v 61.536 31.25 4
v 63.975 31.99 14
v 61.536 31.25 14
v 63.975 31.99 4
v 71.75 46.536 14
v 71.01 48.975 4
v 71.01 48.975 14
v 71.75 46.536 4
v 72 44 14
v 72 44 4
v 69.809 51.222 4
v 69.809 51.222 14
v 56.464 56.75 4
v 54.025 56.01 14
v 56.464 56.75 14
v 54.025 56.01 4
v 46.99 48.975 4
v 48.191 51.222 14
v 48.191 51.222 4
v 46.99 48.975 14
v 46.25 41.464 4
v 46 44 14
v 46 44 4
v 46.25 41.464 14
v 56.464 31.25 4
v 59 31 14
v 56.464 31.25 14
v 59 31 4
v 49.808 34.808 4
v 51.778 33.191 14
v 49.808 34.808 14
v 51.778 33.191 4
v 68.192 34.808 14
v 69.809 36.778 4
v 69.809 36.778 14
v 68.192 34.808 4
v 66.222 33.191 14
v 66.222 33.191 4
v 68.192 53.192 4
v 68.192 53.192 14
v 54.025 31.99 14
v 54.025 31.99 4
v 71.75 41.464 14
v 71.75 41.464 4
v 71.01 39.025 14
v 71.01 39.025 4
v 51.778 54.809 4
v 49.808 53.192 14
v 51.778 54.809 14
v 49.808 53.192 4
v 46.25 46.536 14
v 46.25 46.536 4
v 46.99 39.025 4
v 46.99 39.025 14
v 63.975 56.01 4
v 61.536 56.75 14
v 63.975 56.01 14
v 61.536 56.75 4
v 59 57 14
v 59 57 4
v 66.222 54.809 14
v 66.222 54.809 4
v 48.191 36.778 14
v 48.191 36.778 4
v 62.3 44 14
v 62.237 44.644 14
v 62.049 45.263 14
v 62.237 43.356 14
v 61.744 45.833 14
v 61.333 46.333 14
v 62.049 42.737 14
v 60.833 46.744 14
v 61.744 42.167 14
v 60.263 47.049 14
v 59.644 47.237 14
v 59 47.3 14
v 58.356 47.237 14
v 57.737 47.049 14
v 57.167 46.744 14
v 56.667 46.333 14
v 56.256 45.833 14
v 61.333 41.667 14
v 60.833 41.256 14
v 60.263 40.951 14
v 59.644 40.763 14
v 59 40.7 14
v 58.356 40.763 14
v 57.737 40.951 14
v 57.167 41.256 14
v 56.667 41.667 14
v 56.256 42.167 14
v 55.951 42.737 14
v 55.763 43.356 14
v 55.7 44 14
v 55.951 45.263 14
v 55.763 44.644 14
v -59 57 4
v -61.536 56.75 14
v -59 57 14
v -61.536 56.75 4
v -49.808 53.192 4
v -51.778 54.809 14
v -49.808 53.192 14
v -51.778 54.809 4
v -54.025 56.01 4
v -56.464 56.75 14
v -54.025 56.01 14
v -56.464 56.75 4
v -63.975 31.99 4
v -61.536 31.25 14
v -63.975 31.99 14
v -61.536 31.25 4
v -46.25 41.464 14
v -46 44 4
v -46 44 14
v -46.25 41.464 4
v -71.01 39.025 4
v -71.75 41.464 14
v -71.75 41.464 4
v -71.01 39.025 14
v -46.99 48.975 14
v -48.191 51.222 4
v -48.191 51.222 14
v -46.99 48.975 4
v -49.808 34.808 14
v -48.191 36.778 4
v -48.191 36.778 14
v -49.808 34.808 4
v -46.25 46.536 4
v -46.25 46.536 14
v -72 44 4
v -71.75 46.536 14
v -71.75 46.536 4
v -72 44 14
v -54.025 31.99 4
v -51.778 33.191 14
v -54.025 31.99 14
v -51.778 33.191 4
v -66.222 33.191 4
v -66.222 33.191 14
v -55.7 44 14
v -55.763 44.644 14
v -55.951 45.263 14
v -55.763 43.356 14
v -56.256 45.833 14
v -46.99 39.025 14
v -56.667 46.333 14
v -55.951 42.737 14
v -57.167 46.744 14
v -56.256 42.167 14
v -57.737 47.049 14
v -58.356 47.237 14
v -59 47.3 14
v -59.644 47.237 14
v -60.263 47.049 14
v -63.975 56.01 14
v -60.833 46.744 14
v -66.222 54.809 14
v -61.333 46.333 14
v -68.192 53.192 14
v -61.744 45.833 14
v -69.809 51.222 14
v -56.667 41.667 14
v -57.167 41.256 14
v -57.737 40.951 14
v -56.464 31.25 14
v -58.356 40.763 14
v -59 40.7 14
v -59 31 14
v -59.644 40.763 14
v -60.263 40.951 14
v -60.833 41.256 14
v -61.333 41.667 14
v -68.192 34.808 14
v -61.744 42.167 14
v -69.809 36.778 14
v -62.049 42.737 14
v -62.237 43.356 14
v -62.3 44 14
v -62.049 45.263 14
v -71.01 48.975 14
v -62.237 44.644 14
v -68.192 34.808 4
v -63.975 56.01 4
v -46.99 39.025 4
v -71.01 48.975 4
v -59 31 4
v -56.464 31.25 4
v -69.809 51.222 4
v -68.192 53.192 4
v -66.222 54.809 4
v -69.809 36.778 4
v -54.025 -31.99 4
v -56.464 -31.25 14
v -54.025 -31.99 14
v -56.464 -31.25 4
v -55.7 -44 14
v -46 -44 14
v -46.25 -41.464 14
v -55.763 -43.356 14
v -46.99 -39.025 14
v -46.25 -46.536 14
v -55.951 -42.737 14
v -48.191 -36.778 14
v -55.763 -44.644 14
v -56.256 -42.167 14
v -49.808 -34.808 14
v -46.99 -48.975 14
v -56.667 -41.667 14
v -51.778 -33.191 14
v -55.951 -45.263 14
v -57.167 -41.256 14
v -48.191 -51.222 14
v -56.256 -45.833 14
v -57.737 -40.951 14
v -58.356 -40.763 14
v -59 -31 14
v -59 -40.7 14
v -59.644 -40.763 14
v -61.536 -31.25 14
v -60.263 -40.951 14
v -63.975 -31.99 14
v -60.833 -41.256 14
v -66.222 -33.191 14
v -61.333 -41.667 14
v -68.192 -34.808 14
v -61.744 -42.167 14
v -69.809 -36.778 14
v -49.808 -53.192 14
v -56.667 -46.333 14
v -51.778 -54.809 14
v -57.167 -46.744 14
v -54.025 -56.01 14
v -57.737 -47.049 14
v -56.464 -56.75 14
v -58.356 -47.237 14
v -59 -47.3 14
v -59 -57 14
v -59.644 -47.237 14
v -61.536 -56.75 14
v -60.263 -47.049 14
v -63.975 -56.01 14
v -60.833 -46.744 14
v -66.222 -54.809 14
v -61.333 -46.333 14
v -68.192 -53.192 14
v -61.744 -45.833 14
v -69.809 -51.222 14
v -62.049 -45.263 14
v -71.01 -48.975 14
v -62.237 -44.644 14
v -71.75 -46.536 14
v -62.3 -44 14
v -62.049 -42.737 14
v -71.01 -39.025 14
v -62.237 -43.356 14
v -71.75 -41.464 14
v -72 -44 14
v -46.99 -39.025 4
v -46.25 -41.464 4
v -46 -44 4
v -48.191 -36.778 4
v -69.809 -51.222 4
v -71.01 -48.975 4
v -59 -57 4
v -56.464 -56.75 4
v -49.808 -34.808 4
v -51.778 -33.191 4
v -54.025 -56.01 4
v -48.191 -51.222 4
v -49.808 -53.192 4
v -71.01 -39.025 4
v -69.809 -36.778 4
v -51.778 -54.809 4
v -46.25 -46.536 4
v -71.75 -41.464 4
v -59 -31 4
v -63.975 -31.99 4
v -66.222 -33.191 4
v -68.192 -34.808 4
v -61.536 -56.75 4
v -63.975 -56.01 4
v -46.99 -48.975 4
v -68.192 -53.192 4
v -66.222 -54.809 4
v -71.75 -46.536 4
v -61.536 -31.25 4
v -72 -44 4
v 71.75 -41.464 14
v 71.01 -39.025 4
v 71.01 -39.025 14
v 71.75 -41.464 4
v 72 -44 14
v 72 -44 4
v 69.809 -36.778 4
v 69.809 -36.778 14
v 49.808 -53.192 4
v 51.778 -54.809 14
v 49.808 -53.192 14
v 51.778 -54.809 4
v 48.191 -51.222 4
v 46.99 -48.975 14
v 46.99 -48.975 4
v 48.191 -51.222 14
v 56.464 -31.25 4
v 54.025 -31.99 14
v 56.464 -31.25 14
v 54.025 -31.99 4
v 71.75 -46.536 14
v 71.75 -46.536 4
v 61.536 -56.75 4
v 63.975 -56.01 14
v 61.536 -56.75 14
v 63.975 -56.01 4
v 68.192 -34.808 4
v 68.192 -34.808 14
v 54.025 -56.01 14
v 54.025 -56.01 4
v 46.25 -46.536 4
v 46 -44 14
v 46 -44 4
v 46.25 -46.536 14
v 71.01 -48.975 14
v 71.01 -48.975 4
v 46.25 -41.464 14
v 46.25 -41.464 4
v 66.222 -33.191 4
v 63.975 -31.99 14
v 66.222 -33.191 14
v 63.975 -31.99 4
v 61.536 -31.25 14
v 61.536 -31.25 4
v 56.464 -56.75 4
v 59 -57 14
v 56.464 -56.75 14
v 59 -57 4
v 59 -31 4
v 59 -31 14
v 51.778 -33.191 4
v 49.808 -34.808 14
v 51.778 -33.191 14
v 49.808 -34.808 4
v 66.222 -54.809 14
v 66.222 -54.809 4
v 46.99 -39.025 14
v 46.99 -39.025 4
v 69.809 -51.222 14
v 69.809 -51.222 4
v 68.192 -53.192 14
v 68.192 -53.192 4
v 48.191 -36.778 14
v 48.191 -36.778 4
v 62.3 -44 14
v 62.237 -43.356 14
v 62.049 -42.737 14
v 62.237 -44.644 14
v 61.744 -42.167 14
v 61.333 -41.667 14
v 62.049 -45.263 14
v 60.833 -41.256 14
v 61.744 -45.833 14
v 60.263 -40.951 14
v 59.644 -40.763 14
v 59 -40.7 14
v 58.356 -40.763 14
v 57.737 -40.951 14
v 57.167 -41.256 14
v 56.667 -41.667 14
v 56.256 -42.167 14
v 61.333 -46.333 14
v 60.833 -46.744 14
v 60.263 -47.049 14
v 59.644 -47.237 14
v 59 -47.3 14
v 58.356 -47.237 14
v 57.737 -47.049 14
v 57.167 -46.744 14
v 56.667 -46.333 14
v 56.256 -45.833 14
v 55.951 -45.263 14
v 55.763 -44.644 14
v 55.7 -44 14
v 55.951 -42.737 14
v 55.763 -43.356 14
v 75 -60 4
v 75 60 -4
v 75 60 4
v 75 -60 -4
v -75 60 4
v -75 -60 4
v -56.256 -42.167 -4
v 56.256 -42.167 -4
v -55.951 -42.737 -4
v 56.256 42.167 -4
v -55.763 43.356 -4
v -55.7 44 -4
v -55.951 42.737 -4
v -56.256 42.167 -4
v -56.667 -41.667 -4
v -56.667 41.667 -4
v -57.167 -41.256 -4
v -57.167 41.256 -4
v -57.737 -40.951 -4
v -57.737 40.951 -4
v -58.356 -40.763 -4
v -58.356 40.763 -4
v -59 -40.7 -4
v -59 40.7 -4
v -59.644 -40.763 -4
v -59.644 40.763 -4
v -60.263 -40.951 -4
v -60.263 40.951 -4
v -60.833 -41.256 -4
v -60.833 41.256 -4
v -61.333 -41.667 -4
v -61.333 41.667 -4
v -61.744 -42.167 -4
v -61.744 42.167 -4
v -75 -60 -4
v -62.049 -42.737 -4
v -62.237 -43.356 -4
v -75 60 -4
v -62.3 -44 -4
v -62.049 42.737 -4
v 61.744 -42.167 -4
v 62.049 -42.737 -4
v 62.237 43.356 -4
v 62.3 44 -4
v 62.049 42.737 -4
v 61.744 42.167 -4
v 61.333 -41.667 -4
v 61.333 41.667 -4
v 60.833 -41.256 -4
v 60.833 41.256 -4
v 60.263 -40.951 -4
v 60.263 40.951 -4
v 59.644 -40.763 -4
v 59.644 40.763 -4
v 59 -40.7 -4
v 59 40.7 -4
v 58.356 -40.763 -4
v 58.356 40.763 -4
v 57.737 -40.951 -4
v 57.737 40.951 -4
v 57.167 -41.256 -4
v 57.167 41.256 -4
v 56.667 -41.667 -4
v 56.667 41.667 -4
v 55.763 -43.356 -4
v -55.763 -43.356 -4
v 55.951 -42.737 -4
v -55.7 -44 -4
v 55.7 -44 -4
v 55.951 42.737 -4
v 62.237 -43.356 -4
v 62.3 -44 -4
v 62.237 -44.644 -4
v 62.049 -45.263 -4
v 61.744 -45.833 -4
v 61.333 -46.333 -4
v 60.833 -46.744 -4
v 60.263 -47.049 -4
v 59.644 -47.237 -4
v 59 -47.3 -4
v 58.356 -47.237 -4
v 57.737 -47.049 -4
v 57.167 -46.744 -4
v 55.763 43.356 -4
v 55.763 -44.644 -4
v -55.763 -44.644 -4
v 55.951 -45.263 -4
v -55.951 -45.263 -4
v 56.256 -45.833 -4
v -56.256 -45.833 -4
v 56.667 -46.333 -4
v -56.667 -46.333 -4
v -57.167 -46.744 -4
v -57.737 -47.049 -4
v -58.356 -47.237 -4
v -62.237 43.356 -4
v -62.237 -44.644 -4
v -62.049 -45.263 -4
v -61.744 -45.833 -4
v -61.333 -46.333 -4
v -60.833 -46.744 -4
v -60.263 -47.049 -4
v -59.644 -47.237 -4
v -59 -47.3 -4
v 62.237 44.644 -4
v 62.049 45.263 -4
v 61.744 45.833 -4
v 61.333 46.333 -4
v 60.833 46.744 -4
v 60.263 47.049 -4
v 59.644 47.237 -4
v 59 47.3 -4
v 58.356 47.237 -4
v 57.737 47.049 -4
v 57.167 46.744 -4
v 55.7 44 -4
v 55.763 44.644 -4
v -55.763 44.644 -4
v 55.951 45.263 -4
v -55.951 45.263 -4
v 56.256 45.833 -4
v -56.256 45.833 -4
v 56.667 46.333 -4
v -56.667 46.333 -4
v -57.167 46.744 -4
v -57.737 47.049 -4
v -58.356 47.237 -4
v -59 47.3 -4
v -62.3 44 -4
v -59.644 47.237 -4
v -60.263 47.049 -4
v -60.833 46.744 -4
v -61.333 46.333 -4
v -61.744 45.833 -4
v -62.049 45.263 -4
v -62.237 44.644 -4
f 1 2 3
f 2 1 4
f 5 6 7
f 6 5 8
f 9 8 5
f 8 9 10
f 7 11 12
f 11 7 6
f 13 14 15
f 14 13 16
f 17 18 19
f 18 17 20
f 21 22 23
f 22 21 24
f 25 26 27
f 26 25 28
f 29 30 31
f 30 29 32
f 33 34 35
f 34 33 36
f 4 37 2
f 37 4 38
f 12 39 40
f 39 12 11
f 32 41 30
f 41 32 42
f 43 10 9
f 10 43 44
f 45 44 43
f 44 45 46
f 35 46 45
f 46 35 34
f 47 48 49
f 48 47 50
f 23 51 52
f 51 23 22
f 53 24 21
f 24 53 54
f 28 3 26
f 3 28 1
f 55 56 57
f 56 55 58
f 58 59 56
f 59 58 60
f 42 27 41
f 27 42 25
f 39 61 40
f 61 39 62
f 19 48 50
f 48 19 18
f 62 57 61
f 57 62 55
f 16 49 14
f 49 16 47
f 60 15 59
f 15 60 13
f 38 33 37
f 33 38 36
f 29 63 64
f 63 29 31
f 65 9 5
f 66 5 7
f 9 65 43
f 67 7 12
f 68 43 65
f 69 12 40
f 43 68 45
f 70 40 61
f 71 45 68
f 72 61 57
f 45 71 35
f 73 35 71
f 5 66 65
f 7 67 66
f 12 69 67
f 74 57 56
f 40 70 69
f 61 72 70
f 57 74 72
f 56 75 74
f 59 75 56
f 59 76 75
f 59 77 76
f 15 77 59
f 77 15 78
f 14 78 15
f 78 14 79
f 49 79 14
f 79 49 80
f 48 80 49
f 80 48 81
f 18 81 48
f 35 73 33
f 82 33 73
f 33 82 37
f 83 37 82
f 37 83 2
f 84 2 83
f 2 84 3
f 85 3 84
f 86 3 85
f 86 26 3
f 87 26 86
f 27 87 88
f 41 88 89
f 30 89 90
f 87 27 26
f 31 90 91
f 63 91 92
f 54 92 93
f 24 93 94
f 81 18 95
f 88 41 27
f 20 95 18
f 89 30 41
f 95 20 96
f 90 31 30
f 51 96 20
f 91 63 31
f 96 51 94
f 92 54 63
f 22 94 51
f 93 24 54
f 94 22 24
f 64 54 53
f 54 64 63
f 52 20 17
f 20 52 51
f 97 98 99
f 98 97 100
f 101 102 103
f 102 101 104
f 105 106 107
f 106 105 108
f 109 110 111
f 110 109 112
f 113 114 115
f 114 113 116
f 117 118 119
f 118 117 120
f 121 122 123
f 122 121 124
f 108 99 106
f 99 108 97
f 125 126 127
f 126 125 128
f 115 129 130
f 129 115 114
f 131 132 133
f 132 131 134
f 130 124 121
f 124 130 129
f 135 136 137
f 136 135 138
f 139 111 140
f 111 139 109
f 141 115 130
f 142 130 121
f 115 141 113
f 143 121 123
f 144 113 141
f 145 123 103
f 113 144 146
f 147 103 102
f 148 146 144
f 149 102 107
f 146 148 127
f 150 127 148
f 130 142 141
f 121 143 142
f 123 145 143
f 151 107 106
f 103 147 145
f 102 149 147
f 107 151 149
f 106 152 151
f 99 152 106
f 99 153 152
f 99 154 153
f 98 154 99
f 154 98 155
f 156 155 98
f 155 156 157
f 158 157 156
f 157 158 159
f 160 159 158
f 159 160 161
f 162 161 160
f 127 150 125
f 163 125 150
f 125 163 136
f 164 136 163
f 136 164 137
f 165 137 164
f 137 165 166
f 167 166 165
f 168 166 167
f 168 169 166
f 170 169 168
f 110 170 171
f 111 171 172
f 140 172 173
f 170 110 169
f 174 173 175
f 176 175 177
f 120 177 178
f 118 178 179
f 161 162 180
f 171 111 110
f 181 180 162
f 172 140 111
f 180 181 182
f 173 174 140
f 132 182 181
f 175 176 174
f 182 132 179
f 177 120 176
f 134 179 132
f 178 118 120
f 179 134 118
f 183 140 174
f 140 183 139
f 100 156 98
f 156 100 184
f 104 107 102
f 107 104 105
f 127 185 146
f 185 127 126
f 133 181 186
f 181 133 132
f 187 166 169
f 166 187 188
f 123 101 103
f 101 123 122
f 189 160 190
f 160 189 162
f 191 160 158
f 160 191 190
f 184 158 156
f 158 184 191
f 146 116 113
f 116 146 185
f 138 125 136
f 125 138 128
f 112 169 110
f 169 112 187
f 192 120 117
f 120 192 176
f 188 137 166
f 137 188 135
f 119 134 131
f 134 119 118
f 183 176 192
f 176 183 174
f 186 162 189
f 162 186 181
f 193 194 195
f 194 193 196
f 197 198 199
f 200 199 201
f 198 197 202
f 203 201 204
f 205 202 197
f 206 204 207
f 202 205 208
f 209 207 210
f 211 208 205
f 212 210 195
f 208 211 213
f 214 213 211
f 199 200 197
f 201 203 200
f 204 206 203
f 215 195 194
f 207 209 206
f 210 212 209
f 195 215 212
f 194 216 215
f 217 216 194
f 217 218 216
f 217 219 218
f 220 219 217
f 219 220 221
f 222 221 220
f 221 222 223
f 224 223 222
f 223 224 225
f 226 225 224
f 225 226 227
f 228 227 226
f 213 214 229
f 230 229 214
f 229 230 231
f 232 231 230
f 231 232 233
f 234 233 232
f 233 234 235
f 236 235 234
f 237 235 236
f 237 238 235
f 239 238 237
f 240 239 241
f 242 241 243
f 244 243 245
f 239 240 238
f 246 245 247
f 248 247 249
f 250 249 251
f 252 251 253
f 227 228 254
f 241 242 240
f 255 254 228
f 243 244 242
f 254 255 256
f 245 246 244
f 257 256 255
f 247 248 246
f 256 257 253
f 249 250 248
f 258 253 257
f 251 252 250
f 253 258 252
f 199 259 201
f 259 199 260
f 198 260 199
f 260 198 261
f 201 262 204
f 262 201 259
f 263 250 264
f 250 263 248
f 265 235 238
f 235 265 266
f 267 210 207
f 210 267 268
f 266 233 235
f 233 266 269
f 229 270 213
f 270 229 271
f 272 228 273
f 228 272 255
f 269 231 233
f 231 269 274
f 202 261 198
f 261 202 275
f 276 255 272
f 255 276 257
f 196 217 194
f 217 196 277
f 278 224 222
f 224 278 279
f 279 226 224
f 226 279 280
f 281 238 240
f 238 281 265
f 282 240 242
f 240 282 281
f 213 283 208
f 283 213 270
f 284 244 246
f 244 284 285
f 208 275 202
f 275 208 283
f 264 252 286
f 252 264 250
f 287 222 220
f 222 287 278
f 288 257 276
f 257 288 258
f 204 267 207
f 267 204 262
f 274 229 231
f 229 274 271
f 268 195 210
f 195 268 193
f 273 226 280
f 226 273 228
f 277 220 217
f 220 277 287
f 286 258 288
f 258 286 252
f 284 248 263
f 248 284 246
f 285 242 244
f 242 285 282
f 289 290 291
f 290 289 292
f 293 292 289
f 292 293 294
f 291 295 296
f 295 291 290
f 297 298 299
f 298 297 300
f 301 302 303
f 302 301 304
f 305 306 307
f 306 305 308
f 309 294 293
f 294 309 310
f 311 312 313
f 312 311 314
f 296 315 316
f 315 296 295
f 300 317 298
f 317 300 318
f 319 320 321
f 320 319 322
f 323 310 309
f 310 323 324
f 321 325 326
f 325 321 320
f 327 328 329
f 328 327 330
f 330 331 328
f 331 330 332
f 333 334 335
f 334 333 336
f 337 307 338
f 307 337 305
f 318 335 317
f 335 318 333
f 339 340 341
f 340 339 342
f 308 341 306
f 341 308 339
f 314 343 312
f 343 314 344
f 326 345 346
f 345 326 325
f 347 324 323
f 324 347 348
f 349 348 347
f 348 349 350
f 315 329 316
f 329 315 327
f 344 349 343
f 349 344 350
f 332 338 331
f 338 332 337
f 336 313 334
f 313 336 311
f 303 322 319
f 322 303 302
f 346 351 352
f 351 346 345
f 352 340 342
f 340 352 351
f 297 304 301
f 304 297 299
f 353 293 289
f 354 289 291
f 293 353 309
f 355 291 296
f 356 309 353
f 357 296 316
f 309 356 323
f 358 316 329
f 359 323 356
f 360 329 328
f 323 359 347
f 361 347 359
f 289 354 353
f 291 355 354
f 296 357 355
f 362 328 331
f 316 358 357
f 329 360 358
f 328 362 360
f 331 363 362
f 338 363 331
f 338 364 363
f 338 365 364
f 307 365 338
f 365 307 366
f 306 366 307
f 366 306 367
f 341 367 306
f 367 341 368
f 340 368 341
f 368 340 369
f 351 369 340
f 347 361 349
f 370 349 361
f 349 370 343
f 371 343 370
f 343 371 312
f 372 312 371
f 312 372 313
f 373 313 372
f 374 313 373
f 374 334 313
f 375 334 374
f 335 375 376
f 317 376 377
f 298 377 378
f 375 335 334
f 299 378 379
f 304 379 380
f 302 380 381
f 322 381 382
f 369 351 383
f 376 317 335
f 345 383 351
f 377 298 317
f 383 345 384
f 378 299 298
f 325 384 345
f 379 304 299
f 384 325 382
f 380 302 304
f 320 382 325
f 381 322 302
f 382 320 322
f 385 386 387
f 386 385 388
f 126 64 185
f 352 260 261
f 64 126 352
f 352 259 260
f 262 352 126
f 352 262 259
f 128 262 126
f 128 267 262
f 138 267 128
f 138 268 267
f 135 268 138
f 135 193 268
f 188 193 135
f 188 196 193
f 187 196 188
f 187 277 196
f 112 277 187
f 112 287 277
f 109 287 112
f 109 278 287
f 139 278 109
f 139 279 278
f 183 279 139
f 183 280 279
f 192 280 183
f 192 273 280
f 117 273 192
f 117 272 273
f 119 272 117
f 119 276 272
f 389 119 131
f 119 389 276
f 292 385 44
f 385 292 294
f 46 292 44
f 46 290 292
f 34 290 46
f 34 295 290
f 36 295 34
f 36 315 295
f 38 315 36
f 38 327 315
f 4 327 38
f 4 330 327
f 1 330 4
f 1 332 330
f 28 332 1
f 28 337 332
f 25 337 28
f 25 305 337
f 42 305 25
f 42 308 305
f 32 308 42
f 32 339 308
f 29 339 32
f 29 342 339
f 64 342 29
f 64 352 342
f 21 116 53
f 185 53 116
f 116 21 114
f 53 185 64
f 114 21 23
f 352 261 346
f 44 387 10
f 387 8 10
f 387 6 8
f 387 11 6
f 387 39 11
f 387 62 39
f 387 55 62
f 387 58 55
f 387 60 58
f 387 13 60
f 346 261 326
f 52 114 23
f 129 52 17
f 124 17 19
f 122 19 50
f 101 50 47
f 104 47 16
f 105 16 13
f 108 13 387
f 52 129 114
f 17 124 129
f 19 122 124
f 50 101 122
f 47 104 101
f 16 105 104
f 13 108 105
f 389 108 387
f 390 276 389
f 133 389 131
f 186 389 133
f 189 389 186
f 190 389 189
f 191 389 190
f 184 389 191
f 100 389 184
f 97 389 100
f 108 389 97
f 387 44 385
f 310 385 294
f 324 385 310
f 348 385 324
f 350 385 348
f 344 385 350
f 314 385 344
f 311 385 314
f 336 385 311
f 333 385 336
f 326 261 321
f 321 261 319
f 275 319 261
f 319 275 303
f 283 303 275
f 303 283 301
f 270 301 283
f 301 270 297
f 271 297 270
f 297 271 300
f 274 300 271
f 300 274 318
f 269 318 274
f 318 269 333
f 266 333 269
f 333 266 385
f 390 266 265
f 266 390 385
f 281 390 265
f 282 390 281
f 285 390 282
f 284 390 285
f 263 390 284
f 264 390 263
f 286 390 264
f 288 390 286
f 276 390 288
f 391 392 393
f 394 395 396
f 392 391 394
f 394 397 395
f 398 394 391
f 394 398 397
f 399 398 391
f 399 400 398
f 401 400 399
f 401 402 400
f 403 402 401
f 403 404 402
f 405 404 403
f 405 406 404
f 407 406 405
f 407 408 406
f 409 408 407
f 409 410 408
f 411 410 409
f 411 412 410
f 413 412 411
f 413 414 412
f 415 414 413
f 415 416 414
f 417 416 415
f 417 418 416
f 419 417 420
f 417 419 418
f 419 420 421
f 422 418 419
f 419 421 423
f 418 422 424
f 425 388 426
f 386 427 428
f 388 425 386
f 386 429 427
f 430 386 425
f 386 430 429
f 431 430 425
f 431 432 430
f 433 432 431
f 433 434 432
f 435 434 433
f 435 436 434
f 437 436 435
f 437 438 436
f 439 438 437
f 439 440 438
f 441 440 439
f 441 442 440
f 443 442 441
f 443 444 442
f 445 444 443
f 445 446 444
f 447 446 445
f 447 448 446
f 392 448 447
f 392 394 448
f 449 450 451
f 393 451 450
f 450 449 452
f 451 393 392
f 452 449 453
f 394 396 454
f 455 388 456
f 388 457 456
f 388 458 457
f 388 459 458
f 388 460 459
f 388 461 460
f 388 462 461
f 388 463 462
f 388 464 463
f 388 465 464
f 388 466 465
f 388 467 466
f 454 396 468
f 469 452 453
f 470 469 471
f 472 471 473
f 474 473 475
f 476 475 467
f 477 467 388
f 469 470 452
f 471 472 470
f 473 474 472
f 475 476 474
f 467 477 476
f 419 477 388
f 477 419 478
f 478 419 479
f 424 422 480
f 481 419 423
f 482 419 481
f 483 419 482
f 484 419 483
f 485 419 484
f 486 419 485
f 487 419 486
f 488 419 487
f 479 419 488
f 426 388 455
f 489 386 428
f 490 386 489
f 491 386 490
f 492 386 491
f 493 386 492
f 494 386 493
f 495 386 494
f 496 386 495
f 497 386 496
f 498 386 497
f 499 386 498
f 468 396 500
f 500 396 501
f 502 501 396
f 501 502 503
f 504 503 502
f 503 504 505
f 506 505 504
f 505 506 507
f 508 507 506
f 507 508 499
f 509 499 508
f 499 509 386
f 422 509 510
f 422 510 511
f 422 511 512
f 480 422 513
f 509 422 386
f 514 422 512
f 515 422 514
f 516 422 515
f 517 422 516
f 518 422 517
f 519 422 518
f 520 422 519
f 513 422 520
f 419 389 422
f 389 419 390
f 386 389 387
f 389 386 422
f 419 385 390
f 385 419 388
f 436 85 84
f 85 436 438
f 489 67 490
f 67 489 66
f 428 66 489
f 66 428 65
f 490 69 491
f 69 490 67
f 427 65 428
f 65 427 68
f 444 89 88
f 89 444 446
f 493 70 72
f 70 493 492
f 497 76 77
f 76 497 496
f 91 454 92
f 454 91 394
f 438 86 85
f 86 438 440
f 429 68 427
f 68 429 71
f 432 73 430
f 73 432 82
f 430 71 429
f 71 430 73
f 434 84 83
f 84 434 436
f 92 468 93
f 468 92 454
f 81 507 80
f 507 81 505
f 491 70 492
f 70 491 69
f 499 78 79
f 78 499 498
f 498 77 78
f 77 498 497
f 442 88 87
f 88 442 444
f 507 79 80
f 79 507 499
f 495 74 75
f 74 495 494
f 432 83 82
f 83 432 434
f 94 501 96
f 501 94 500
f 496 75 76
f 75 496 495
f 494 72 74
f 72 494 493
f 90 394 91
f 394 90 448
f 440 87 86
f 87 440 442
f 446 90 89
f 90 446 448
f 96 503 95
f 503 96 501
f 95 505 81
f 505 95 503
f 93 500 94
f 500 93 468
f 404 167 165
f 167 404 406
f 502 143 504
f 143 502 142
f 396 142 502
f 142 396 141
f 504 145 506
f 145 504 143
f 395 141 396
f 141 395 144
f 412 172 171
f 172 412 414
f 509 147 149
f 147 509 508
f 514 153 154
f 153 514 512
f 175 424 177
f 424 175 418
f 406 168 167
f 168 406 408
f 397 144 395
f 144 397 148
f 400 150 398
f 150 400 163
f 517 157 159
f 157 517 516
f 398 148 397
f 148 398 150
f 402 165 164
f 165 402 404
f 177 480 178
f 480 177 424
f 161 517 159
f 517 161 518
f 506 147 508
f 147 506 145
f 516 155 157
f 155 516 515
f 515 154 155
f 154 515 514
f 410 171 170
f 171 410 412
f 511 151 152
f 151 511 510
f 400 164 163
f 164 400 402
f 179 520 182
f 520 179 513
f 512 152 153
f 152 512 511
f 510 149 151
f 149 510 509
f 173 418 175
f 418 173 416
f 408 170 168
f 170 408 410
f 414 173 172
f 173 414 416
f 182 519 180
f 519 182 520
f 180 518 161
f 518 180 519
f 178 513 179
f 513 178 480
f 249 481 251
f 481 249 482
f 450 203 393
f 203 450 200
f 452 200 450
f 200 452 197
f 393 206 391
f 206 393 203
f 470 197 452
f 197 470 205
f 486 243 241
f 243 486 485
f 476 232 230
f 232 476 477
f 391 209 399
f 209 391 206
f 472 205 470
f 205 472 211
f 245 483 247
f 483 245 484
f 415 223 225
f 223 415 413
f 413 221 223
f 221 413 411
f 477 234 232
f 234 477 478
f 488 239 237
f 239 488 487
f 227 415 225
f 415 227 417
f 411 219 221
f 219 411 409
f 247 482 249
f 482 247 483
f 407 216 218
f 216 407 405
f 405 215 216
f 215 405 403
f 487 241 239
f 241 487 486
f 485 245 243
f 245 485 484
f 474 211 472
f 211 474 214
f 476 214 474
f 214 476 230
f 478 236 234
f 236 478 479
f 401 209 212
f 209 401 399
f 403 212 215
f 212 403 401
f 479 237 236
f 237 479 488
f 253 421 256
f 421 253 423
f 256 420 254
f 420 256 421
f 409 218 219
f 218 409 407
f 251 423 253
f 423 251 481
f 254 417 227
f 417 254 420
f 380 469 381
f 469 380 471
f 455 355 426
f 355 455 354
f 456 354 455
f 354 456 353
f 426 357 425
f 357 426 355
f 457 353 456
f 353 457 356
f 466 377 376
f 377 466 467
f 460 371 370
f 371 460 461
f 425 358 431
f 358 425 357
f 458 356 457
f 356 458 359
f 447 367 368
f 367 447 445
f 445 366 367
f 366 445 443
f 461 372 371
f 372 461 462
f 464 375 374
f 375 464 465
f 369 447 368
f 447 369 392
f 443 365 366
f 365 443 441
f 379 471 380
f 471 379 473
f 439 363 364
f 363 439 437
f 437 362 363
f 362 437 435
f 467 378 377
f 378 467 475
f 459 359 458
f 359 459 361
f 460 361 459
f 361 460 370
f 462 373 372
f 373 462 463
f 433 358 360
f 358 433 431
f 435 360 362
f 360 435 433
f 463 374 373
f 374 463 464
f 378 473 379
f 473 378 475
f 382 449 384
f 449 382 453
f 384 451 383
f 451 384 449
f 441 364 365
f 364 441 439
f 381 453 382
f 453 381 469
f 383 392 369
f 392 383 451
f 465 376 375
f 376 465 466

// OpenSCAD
$fn = 32;

// ----------------------------------------------------------------------
// Anchor pads 150 x 120 x 18
// four corner bosses with anchor holes
// ----------------------------------------------------------------------

// --- parameters (mm) ---
plate = [150, 120, 8];  // base plate size (x, y, z)
pads = 4;               // boss count, one per corner
edge = 16;              // boss centre offset from the plate edge
boss_d = 26;            // boss diameter
boss_h = 10;            // boss height above the base plate
hole_d = 6.6;           // hole diameter

// --- derived feature positions (mm) ---
height = plate[2] + boss_h;      // = 18   overall height of the part
corner_x = plate[0] / 2 - edge;  // = 59   boss centre X
corner_y = plate[1] / 2 - edge;  // = 44   boss centre Y
feature_centers = [
  [corner_x, corner_y],
  [-corner_x, corner_y],
  [-corner_x, -corner_y],
  [corner_x, -corner_y]
];   // boss centres, anchor holes are drilled there

// base plate, four bosses standing on it, anchor holes all the way through
difference() {
  union() {
    cube(plate, center = true);
    for (centre = feature_centers)
      translate([centre[0], centre[1], plate[2] / 2 - 1])
        cylinder(d = boss_d, h = boss_h + 1);
  }
  for (centre = feature_centers)
    translate([centre[0], centre[1], -height])
      cylinder(d = hole_d, h = 2 * height + 2);  // through boss and plate
}
